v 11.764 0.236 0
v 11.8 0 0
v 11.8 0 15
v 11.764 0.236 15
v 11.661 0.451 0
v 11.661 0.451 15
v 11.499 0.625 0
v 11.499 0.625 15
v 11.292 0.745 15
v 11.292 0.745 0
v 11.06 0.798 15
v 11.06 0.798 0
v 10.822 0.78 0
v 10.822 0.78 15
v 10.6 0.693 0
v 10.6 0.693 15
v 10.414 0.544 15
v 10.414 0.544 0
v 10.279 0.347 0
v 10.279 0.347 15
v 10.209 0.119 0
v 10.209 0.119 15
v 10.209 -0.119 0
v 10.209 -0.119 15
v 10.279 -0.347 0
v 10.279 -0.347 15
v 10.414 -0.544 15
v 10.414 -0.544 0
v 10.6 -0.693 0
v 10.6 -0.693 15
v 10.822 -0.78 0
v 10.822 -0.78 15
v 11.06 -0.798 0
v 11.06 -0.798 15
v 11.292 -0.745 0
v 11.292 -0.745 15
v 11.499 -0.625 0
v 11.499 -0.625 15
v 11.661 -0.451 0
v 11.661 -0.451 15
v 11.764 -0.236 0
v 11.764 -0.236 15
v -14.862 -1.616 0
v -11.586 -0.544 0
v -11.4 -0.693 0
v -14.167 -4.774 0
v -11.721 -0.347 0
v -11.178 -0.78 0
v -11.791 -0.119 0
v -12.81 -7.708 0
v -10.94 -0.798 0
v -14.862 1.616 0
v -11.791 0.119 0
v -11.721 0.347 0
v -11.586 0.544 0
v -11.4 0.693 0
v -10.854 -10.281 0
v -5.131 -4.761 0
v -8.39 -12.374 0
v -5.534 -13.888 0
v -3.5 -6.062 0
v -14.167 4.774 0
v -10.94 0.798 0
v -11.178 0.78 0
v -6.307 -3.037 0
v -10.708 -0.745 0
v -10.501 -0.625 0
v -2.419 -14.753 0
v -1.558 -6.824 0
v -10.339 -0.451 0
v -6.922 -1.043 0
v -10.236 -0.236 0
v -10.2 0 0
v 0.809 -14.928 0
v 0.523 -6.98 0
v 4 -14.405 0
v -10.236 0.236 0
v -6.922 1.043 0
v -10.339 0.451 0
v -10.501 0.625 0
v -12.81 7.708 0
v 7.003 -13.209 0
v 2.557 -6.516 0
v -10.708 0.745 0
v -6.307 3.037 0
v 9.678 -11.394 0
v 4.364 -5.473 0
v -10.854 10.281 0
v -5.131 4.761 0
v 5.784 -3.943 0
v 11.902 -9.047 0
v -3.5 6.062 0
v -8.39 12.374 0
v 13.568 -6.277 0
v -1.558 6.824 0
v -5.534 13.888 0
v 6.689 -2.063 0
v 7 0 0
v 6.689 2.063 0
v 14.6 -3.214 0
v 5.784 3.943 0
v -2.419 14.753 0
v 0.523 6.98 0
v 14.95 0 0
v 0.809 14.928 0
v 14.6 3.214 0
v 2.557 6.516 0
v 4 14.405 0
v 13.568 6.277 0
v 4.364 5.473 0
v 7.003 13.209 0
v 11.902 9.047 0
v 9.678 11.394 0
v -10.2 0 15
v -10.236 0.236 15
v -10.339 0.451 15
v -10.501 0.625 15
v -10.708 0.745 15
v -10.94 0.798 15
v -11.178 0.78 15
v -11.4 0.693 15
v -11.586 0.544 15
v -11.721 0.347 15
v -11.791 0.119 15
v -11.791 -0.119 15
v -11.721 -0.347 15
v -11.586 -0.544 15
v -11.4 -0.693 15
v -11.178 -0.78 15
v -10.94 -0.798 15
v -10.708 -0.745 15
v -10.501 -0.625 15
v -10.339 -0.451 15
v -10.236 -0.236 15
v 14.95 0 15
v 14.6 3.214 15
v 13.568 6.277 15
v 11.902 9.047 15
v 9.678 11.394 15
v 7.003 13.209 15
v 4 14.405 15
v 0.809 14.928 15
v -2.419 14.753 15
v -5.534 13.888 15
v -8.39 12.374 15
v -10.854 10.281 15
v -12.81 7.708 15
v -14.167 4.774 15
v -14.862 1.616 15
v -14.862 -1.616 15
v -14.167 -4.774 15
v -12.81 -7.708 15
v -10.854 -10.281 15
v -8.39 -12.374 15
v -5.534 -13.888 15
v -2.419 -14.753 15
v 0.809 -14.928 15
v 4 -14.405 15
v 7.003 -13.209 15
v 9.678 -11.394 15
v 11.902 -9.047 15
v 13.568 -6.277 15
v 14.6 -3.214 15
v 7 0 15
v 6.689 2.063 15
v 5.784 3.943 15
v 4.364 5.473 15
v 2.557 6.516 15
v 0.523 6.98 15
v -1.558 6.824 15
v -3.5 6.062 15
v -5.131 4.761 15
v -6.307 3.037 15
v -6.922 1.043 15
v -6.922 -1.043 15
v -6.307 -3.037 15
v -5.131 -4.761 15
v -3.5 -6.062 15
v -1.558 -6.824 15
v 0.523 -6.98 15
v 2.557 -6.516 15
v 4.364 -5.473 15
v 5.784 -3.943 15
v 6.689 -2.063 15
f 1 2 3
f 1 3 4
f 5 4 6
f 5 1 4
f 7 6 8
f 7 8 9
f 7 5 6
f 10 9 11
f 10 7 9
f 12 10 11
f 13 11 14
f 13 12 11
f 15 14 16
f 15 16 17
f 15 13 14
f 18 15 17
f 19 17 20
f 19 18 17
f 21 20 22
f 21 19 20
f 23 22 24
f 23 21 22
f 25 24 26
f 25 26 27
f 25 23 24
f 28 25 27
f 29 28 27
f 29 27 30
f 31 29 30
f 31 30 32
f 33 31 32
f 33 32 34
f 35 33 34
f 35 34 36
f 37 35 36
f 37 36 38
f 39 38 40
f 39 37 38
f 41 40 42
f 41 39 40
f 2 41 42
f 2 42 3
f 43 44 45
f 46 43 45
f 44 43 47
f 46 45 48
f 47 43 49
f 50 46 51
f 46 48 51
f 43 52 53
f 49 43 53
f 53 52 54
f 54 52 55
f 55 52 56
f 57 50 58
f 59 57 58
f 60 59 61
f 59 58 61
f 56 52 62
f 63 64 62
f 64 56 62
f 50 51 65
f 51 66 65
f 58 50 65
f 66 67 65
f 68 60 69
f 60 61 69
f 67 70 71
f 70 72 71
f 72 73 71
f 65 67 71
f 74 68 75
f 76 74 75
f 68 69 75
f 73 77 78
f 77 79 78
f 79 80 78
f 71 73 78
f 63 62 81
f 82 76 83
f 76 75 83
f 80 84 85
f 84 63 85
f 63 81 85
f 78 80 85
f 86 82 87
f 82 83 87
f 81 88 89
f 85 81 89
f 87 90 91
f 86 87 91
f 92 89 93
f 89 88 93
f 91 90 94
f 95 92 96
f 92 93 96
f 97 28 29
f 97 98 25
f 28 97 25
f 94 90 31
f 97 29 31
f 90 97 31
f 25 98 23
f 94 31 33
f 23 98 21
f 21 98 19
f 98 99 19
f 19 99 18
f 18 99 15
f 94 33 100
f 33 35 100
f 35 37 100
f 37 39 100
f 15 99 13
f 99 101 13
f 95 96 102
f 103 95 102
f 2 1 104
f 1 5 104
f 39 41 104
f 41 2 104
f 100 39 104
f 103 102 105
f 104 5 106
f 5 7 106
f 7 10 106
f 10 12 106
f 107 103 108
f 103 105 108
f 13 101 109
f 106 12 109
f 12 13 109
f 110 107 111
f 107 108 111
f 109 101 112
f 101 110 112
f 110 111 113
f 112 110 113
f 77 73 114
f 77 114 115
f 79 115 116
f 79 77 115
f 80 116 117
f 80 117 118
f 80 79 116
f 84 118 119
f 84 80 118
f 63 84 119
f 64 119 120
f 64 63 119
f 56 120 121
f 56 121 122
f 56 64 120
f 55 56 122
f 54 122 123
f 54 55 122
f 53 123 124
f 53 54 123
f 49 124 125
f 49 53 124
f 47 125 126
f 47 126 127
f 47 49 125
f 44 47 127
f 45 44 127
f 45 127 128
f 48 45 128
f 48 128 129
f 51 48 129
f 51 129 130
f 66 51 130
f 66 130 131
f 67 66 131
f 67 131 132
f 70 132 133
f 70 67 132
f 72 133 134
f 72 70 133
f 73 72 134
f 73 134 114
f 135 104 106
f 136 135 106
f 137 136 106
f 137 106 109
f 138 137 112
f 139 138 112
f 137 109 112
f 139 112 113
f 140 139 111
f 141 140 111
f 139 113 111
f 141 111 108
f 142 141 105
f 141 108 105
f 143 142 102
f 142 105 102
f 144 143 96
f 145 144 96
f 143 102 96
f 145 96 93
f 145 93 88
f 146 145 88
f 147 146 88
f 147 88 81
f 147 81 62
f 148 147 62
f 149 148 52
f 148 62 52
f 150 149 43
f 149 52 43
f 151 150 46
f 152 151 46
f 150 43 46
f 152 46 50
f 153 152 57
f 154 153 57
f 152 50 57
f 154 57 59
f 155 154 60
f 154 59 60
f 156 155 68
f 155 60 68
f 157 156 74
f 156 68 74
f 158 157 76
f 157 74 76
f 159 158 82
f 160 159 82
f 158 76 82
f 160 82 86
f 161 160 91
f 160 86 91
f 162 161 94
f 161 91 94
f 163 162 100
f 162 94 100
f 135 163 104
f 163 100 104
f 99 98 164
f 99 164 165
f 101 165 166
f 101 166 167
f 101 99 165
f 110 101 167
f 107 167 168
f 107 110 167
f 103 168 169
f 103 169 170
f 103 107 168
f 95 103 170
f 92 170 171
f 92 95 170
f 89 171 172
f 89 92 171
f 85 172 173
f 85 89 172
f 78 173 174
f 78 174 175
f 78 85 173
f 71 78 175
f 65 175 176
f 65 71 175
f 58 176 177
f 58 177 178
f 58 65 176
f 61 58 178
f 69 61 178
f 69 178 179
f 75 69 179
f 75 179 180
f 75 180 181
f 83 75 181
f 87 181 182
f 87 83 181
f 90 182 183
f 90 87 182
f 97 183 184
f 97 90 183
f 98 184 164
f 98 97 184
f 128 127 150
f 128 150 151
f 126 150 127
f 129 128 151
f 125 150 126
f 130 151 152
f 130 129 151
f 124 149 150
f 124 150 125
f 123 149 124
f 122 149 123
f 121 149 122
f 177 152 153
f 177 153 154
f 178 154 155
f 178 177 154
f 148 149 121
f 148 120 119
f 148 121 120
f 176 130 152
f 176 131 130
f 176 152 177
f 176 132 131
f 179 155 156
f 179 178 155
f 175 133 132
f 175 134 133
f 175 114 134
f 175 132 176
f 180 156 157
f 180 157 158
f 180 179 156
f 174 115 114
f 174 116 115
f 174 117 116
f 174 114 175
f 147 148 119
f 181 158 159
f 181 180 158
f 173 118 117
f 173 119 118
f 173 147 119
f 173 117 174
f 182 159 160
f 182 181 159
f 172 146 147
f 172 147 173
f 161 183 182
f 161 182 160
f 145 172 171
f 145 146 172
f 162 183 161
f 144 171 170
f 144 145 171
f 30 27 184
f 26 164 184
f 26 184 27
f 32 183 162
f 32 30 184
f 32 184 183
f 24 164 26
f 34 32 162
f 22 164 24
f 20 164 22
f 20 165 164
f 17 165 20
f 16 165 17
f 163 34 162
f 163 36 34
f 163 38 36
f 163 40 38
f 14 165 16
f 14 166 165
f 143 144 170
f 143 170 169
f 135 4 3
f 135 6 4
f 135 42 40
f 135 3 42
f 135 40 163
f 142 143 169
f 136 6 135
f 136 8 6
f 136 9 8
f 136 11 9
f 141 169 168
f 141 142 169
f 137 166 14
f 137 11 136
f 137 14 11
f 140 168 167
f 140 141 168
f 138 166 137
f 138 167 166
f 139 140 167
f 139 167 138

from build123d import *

# Parameters (mm, degrees)
F0_R     = 14.95
F1_DEPTH = 15
F2_R     = 7
F3_DEPTH = 15
F4_R     = 0.8
F5_DEPTH = 15


with BuildPart() as f1:
    # F0 (on Top) → F1 (new body)
    with BuildSketch(Plane.XY):
        Circle(F0_R)
    extrude(amount=F1_DEPTH)

    # F2 (on Top) → F3 (cut)
    with BuildSketch(Plane.XY):
        Circle(F2_R)
    extrude(amount=F3_DEPTH, mode=Mode.SUBTRACT)

    # F4 (on Top) → F5 (cut)
    with BuildSketch(Plane.XY):
        with Locations((-11, 0)):
            Circle(F4_R)
        with Locations((11, 0)):
            Circle(F4_R)
    extrude(amount=F5_DEPTH, mode=Mode.SUBTRACT)


solid = f1.part
